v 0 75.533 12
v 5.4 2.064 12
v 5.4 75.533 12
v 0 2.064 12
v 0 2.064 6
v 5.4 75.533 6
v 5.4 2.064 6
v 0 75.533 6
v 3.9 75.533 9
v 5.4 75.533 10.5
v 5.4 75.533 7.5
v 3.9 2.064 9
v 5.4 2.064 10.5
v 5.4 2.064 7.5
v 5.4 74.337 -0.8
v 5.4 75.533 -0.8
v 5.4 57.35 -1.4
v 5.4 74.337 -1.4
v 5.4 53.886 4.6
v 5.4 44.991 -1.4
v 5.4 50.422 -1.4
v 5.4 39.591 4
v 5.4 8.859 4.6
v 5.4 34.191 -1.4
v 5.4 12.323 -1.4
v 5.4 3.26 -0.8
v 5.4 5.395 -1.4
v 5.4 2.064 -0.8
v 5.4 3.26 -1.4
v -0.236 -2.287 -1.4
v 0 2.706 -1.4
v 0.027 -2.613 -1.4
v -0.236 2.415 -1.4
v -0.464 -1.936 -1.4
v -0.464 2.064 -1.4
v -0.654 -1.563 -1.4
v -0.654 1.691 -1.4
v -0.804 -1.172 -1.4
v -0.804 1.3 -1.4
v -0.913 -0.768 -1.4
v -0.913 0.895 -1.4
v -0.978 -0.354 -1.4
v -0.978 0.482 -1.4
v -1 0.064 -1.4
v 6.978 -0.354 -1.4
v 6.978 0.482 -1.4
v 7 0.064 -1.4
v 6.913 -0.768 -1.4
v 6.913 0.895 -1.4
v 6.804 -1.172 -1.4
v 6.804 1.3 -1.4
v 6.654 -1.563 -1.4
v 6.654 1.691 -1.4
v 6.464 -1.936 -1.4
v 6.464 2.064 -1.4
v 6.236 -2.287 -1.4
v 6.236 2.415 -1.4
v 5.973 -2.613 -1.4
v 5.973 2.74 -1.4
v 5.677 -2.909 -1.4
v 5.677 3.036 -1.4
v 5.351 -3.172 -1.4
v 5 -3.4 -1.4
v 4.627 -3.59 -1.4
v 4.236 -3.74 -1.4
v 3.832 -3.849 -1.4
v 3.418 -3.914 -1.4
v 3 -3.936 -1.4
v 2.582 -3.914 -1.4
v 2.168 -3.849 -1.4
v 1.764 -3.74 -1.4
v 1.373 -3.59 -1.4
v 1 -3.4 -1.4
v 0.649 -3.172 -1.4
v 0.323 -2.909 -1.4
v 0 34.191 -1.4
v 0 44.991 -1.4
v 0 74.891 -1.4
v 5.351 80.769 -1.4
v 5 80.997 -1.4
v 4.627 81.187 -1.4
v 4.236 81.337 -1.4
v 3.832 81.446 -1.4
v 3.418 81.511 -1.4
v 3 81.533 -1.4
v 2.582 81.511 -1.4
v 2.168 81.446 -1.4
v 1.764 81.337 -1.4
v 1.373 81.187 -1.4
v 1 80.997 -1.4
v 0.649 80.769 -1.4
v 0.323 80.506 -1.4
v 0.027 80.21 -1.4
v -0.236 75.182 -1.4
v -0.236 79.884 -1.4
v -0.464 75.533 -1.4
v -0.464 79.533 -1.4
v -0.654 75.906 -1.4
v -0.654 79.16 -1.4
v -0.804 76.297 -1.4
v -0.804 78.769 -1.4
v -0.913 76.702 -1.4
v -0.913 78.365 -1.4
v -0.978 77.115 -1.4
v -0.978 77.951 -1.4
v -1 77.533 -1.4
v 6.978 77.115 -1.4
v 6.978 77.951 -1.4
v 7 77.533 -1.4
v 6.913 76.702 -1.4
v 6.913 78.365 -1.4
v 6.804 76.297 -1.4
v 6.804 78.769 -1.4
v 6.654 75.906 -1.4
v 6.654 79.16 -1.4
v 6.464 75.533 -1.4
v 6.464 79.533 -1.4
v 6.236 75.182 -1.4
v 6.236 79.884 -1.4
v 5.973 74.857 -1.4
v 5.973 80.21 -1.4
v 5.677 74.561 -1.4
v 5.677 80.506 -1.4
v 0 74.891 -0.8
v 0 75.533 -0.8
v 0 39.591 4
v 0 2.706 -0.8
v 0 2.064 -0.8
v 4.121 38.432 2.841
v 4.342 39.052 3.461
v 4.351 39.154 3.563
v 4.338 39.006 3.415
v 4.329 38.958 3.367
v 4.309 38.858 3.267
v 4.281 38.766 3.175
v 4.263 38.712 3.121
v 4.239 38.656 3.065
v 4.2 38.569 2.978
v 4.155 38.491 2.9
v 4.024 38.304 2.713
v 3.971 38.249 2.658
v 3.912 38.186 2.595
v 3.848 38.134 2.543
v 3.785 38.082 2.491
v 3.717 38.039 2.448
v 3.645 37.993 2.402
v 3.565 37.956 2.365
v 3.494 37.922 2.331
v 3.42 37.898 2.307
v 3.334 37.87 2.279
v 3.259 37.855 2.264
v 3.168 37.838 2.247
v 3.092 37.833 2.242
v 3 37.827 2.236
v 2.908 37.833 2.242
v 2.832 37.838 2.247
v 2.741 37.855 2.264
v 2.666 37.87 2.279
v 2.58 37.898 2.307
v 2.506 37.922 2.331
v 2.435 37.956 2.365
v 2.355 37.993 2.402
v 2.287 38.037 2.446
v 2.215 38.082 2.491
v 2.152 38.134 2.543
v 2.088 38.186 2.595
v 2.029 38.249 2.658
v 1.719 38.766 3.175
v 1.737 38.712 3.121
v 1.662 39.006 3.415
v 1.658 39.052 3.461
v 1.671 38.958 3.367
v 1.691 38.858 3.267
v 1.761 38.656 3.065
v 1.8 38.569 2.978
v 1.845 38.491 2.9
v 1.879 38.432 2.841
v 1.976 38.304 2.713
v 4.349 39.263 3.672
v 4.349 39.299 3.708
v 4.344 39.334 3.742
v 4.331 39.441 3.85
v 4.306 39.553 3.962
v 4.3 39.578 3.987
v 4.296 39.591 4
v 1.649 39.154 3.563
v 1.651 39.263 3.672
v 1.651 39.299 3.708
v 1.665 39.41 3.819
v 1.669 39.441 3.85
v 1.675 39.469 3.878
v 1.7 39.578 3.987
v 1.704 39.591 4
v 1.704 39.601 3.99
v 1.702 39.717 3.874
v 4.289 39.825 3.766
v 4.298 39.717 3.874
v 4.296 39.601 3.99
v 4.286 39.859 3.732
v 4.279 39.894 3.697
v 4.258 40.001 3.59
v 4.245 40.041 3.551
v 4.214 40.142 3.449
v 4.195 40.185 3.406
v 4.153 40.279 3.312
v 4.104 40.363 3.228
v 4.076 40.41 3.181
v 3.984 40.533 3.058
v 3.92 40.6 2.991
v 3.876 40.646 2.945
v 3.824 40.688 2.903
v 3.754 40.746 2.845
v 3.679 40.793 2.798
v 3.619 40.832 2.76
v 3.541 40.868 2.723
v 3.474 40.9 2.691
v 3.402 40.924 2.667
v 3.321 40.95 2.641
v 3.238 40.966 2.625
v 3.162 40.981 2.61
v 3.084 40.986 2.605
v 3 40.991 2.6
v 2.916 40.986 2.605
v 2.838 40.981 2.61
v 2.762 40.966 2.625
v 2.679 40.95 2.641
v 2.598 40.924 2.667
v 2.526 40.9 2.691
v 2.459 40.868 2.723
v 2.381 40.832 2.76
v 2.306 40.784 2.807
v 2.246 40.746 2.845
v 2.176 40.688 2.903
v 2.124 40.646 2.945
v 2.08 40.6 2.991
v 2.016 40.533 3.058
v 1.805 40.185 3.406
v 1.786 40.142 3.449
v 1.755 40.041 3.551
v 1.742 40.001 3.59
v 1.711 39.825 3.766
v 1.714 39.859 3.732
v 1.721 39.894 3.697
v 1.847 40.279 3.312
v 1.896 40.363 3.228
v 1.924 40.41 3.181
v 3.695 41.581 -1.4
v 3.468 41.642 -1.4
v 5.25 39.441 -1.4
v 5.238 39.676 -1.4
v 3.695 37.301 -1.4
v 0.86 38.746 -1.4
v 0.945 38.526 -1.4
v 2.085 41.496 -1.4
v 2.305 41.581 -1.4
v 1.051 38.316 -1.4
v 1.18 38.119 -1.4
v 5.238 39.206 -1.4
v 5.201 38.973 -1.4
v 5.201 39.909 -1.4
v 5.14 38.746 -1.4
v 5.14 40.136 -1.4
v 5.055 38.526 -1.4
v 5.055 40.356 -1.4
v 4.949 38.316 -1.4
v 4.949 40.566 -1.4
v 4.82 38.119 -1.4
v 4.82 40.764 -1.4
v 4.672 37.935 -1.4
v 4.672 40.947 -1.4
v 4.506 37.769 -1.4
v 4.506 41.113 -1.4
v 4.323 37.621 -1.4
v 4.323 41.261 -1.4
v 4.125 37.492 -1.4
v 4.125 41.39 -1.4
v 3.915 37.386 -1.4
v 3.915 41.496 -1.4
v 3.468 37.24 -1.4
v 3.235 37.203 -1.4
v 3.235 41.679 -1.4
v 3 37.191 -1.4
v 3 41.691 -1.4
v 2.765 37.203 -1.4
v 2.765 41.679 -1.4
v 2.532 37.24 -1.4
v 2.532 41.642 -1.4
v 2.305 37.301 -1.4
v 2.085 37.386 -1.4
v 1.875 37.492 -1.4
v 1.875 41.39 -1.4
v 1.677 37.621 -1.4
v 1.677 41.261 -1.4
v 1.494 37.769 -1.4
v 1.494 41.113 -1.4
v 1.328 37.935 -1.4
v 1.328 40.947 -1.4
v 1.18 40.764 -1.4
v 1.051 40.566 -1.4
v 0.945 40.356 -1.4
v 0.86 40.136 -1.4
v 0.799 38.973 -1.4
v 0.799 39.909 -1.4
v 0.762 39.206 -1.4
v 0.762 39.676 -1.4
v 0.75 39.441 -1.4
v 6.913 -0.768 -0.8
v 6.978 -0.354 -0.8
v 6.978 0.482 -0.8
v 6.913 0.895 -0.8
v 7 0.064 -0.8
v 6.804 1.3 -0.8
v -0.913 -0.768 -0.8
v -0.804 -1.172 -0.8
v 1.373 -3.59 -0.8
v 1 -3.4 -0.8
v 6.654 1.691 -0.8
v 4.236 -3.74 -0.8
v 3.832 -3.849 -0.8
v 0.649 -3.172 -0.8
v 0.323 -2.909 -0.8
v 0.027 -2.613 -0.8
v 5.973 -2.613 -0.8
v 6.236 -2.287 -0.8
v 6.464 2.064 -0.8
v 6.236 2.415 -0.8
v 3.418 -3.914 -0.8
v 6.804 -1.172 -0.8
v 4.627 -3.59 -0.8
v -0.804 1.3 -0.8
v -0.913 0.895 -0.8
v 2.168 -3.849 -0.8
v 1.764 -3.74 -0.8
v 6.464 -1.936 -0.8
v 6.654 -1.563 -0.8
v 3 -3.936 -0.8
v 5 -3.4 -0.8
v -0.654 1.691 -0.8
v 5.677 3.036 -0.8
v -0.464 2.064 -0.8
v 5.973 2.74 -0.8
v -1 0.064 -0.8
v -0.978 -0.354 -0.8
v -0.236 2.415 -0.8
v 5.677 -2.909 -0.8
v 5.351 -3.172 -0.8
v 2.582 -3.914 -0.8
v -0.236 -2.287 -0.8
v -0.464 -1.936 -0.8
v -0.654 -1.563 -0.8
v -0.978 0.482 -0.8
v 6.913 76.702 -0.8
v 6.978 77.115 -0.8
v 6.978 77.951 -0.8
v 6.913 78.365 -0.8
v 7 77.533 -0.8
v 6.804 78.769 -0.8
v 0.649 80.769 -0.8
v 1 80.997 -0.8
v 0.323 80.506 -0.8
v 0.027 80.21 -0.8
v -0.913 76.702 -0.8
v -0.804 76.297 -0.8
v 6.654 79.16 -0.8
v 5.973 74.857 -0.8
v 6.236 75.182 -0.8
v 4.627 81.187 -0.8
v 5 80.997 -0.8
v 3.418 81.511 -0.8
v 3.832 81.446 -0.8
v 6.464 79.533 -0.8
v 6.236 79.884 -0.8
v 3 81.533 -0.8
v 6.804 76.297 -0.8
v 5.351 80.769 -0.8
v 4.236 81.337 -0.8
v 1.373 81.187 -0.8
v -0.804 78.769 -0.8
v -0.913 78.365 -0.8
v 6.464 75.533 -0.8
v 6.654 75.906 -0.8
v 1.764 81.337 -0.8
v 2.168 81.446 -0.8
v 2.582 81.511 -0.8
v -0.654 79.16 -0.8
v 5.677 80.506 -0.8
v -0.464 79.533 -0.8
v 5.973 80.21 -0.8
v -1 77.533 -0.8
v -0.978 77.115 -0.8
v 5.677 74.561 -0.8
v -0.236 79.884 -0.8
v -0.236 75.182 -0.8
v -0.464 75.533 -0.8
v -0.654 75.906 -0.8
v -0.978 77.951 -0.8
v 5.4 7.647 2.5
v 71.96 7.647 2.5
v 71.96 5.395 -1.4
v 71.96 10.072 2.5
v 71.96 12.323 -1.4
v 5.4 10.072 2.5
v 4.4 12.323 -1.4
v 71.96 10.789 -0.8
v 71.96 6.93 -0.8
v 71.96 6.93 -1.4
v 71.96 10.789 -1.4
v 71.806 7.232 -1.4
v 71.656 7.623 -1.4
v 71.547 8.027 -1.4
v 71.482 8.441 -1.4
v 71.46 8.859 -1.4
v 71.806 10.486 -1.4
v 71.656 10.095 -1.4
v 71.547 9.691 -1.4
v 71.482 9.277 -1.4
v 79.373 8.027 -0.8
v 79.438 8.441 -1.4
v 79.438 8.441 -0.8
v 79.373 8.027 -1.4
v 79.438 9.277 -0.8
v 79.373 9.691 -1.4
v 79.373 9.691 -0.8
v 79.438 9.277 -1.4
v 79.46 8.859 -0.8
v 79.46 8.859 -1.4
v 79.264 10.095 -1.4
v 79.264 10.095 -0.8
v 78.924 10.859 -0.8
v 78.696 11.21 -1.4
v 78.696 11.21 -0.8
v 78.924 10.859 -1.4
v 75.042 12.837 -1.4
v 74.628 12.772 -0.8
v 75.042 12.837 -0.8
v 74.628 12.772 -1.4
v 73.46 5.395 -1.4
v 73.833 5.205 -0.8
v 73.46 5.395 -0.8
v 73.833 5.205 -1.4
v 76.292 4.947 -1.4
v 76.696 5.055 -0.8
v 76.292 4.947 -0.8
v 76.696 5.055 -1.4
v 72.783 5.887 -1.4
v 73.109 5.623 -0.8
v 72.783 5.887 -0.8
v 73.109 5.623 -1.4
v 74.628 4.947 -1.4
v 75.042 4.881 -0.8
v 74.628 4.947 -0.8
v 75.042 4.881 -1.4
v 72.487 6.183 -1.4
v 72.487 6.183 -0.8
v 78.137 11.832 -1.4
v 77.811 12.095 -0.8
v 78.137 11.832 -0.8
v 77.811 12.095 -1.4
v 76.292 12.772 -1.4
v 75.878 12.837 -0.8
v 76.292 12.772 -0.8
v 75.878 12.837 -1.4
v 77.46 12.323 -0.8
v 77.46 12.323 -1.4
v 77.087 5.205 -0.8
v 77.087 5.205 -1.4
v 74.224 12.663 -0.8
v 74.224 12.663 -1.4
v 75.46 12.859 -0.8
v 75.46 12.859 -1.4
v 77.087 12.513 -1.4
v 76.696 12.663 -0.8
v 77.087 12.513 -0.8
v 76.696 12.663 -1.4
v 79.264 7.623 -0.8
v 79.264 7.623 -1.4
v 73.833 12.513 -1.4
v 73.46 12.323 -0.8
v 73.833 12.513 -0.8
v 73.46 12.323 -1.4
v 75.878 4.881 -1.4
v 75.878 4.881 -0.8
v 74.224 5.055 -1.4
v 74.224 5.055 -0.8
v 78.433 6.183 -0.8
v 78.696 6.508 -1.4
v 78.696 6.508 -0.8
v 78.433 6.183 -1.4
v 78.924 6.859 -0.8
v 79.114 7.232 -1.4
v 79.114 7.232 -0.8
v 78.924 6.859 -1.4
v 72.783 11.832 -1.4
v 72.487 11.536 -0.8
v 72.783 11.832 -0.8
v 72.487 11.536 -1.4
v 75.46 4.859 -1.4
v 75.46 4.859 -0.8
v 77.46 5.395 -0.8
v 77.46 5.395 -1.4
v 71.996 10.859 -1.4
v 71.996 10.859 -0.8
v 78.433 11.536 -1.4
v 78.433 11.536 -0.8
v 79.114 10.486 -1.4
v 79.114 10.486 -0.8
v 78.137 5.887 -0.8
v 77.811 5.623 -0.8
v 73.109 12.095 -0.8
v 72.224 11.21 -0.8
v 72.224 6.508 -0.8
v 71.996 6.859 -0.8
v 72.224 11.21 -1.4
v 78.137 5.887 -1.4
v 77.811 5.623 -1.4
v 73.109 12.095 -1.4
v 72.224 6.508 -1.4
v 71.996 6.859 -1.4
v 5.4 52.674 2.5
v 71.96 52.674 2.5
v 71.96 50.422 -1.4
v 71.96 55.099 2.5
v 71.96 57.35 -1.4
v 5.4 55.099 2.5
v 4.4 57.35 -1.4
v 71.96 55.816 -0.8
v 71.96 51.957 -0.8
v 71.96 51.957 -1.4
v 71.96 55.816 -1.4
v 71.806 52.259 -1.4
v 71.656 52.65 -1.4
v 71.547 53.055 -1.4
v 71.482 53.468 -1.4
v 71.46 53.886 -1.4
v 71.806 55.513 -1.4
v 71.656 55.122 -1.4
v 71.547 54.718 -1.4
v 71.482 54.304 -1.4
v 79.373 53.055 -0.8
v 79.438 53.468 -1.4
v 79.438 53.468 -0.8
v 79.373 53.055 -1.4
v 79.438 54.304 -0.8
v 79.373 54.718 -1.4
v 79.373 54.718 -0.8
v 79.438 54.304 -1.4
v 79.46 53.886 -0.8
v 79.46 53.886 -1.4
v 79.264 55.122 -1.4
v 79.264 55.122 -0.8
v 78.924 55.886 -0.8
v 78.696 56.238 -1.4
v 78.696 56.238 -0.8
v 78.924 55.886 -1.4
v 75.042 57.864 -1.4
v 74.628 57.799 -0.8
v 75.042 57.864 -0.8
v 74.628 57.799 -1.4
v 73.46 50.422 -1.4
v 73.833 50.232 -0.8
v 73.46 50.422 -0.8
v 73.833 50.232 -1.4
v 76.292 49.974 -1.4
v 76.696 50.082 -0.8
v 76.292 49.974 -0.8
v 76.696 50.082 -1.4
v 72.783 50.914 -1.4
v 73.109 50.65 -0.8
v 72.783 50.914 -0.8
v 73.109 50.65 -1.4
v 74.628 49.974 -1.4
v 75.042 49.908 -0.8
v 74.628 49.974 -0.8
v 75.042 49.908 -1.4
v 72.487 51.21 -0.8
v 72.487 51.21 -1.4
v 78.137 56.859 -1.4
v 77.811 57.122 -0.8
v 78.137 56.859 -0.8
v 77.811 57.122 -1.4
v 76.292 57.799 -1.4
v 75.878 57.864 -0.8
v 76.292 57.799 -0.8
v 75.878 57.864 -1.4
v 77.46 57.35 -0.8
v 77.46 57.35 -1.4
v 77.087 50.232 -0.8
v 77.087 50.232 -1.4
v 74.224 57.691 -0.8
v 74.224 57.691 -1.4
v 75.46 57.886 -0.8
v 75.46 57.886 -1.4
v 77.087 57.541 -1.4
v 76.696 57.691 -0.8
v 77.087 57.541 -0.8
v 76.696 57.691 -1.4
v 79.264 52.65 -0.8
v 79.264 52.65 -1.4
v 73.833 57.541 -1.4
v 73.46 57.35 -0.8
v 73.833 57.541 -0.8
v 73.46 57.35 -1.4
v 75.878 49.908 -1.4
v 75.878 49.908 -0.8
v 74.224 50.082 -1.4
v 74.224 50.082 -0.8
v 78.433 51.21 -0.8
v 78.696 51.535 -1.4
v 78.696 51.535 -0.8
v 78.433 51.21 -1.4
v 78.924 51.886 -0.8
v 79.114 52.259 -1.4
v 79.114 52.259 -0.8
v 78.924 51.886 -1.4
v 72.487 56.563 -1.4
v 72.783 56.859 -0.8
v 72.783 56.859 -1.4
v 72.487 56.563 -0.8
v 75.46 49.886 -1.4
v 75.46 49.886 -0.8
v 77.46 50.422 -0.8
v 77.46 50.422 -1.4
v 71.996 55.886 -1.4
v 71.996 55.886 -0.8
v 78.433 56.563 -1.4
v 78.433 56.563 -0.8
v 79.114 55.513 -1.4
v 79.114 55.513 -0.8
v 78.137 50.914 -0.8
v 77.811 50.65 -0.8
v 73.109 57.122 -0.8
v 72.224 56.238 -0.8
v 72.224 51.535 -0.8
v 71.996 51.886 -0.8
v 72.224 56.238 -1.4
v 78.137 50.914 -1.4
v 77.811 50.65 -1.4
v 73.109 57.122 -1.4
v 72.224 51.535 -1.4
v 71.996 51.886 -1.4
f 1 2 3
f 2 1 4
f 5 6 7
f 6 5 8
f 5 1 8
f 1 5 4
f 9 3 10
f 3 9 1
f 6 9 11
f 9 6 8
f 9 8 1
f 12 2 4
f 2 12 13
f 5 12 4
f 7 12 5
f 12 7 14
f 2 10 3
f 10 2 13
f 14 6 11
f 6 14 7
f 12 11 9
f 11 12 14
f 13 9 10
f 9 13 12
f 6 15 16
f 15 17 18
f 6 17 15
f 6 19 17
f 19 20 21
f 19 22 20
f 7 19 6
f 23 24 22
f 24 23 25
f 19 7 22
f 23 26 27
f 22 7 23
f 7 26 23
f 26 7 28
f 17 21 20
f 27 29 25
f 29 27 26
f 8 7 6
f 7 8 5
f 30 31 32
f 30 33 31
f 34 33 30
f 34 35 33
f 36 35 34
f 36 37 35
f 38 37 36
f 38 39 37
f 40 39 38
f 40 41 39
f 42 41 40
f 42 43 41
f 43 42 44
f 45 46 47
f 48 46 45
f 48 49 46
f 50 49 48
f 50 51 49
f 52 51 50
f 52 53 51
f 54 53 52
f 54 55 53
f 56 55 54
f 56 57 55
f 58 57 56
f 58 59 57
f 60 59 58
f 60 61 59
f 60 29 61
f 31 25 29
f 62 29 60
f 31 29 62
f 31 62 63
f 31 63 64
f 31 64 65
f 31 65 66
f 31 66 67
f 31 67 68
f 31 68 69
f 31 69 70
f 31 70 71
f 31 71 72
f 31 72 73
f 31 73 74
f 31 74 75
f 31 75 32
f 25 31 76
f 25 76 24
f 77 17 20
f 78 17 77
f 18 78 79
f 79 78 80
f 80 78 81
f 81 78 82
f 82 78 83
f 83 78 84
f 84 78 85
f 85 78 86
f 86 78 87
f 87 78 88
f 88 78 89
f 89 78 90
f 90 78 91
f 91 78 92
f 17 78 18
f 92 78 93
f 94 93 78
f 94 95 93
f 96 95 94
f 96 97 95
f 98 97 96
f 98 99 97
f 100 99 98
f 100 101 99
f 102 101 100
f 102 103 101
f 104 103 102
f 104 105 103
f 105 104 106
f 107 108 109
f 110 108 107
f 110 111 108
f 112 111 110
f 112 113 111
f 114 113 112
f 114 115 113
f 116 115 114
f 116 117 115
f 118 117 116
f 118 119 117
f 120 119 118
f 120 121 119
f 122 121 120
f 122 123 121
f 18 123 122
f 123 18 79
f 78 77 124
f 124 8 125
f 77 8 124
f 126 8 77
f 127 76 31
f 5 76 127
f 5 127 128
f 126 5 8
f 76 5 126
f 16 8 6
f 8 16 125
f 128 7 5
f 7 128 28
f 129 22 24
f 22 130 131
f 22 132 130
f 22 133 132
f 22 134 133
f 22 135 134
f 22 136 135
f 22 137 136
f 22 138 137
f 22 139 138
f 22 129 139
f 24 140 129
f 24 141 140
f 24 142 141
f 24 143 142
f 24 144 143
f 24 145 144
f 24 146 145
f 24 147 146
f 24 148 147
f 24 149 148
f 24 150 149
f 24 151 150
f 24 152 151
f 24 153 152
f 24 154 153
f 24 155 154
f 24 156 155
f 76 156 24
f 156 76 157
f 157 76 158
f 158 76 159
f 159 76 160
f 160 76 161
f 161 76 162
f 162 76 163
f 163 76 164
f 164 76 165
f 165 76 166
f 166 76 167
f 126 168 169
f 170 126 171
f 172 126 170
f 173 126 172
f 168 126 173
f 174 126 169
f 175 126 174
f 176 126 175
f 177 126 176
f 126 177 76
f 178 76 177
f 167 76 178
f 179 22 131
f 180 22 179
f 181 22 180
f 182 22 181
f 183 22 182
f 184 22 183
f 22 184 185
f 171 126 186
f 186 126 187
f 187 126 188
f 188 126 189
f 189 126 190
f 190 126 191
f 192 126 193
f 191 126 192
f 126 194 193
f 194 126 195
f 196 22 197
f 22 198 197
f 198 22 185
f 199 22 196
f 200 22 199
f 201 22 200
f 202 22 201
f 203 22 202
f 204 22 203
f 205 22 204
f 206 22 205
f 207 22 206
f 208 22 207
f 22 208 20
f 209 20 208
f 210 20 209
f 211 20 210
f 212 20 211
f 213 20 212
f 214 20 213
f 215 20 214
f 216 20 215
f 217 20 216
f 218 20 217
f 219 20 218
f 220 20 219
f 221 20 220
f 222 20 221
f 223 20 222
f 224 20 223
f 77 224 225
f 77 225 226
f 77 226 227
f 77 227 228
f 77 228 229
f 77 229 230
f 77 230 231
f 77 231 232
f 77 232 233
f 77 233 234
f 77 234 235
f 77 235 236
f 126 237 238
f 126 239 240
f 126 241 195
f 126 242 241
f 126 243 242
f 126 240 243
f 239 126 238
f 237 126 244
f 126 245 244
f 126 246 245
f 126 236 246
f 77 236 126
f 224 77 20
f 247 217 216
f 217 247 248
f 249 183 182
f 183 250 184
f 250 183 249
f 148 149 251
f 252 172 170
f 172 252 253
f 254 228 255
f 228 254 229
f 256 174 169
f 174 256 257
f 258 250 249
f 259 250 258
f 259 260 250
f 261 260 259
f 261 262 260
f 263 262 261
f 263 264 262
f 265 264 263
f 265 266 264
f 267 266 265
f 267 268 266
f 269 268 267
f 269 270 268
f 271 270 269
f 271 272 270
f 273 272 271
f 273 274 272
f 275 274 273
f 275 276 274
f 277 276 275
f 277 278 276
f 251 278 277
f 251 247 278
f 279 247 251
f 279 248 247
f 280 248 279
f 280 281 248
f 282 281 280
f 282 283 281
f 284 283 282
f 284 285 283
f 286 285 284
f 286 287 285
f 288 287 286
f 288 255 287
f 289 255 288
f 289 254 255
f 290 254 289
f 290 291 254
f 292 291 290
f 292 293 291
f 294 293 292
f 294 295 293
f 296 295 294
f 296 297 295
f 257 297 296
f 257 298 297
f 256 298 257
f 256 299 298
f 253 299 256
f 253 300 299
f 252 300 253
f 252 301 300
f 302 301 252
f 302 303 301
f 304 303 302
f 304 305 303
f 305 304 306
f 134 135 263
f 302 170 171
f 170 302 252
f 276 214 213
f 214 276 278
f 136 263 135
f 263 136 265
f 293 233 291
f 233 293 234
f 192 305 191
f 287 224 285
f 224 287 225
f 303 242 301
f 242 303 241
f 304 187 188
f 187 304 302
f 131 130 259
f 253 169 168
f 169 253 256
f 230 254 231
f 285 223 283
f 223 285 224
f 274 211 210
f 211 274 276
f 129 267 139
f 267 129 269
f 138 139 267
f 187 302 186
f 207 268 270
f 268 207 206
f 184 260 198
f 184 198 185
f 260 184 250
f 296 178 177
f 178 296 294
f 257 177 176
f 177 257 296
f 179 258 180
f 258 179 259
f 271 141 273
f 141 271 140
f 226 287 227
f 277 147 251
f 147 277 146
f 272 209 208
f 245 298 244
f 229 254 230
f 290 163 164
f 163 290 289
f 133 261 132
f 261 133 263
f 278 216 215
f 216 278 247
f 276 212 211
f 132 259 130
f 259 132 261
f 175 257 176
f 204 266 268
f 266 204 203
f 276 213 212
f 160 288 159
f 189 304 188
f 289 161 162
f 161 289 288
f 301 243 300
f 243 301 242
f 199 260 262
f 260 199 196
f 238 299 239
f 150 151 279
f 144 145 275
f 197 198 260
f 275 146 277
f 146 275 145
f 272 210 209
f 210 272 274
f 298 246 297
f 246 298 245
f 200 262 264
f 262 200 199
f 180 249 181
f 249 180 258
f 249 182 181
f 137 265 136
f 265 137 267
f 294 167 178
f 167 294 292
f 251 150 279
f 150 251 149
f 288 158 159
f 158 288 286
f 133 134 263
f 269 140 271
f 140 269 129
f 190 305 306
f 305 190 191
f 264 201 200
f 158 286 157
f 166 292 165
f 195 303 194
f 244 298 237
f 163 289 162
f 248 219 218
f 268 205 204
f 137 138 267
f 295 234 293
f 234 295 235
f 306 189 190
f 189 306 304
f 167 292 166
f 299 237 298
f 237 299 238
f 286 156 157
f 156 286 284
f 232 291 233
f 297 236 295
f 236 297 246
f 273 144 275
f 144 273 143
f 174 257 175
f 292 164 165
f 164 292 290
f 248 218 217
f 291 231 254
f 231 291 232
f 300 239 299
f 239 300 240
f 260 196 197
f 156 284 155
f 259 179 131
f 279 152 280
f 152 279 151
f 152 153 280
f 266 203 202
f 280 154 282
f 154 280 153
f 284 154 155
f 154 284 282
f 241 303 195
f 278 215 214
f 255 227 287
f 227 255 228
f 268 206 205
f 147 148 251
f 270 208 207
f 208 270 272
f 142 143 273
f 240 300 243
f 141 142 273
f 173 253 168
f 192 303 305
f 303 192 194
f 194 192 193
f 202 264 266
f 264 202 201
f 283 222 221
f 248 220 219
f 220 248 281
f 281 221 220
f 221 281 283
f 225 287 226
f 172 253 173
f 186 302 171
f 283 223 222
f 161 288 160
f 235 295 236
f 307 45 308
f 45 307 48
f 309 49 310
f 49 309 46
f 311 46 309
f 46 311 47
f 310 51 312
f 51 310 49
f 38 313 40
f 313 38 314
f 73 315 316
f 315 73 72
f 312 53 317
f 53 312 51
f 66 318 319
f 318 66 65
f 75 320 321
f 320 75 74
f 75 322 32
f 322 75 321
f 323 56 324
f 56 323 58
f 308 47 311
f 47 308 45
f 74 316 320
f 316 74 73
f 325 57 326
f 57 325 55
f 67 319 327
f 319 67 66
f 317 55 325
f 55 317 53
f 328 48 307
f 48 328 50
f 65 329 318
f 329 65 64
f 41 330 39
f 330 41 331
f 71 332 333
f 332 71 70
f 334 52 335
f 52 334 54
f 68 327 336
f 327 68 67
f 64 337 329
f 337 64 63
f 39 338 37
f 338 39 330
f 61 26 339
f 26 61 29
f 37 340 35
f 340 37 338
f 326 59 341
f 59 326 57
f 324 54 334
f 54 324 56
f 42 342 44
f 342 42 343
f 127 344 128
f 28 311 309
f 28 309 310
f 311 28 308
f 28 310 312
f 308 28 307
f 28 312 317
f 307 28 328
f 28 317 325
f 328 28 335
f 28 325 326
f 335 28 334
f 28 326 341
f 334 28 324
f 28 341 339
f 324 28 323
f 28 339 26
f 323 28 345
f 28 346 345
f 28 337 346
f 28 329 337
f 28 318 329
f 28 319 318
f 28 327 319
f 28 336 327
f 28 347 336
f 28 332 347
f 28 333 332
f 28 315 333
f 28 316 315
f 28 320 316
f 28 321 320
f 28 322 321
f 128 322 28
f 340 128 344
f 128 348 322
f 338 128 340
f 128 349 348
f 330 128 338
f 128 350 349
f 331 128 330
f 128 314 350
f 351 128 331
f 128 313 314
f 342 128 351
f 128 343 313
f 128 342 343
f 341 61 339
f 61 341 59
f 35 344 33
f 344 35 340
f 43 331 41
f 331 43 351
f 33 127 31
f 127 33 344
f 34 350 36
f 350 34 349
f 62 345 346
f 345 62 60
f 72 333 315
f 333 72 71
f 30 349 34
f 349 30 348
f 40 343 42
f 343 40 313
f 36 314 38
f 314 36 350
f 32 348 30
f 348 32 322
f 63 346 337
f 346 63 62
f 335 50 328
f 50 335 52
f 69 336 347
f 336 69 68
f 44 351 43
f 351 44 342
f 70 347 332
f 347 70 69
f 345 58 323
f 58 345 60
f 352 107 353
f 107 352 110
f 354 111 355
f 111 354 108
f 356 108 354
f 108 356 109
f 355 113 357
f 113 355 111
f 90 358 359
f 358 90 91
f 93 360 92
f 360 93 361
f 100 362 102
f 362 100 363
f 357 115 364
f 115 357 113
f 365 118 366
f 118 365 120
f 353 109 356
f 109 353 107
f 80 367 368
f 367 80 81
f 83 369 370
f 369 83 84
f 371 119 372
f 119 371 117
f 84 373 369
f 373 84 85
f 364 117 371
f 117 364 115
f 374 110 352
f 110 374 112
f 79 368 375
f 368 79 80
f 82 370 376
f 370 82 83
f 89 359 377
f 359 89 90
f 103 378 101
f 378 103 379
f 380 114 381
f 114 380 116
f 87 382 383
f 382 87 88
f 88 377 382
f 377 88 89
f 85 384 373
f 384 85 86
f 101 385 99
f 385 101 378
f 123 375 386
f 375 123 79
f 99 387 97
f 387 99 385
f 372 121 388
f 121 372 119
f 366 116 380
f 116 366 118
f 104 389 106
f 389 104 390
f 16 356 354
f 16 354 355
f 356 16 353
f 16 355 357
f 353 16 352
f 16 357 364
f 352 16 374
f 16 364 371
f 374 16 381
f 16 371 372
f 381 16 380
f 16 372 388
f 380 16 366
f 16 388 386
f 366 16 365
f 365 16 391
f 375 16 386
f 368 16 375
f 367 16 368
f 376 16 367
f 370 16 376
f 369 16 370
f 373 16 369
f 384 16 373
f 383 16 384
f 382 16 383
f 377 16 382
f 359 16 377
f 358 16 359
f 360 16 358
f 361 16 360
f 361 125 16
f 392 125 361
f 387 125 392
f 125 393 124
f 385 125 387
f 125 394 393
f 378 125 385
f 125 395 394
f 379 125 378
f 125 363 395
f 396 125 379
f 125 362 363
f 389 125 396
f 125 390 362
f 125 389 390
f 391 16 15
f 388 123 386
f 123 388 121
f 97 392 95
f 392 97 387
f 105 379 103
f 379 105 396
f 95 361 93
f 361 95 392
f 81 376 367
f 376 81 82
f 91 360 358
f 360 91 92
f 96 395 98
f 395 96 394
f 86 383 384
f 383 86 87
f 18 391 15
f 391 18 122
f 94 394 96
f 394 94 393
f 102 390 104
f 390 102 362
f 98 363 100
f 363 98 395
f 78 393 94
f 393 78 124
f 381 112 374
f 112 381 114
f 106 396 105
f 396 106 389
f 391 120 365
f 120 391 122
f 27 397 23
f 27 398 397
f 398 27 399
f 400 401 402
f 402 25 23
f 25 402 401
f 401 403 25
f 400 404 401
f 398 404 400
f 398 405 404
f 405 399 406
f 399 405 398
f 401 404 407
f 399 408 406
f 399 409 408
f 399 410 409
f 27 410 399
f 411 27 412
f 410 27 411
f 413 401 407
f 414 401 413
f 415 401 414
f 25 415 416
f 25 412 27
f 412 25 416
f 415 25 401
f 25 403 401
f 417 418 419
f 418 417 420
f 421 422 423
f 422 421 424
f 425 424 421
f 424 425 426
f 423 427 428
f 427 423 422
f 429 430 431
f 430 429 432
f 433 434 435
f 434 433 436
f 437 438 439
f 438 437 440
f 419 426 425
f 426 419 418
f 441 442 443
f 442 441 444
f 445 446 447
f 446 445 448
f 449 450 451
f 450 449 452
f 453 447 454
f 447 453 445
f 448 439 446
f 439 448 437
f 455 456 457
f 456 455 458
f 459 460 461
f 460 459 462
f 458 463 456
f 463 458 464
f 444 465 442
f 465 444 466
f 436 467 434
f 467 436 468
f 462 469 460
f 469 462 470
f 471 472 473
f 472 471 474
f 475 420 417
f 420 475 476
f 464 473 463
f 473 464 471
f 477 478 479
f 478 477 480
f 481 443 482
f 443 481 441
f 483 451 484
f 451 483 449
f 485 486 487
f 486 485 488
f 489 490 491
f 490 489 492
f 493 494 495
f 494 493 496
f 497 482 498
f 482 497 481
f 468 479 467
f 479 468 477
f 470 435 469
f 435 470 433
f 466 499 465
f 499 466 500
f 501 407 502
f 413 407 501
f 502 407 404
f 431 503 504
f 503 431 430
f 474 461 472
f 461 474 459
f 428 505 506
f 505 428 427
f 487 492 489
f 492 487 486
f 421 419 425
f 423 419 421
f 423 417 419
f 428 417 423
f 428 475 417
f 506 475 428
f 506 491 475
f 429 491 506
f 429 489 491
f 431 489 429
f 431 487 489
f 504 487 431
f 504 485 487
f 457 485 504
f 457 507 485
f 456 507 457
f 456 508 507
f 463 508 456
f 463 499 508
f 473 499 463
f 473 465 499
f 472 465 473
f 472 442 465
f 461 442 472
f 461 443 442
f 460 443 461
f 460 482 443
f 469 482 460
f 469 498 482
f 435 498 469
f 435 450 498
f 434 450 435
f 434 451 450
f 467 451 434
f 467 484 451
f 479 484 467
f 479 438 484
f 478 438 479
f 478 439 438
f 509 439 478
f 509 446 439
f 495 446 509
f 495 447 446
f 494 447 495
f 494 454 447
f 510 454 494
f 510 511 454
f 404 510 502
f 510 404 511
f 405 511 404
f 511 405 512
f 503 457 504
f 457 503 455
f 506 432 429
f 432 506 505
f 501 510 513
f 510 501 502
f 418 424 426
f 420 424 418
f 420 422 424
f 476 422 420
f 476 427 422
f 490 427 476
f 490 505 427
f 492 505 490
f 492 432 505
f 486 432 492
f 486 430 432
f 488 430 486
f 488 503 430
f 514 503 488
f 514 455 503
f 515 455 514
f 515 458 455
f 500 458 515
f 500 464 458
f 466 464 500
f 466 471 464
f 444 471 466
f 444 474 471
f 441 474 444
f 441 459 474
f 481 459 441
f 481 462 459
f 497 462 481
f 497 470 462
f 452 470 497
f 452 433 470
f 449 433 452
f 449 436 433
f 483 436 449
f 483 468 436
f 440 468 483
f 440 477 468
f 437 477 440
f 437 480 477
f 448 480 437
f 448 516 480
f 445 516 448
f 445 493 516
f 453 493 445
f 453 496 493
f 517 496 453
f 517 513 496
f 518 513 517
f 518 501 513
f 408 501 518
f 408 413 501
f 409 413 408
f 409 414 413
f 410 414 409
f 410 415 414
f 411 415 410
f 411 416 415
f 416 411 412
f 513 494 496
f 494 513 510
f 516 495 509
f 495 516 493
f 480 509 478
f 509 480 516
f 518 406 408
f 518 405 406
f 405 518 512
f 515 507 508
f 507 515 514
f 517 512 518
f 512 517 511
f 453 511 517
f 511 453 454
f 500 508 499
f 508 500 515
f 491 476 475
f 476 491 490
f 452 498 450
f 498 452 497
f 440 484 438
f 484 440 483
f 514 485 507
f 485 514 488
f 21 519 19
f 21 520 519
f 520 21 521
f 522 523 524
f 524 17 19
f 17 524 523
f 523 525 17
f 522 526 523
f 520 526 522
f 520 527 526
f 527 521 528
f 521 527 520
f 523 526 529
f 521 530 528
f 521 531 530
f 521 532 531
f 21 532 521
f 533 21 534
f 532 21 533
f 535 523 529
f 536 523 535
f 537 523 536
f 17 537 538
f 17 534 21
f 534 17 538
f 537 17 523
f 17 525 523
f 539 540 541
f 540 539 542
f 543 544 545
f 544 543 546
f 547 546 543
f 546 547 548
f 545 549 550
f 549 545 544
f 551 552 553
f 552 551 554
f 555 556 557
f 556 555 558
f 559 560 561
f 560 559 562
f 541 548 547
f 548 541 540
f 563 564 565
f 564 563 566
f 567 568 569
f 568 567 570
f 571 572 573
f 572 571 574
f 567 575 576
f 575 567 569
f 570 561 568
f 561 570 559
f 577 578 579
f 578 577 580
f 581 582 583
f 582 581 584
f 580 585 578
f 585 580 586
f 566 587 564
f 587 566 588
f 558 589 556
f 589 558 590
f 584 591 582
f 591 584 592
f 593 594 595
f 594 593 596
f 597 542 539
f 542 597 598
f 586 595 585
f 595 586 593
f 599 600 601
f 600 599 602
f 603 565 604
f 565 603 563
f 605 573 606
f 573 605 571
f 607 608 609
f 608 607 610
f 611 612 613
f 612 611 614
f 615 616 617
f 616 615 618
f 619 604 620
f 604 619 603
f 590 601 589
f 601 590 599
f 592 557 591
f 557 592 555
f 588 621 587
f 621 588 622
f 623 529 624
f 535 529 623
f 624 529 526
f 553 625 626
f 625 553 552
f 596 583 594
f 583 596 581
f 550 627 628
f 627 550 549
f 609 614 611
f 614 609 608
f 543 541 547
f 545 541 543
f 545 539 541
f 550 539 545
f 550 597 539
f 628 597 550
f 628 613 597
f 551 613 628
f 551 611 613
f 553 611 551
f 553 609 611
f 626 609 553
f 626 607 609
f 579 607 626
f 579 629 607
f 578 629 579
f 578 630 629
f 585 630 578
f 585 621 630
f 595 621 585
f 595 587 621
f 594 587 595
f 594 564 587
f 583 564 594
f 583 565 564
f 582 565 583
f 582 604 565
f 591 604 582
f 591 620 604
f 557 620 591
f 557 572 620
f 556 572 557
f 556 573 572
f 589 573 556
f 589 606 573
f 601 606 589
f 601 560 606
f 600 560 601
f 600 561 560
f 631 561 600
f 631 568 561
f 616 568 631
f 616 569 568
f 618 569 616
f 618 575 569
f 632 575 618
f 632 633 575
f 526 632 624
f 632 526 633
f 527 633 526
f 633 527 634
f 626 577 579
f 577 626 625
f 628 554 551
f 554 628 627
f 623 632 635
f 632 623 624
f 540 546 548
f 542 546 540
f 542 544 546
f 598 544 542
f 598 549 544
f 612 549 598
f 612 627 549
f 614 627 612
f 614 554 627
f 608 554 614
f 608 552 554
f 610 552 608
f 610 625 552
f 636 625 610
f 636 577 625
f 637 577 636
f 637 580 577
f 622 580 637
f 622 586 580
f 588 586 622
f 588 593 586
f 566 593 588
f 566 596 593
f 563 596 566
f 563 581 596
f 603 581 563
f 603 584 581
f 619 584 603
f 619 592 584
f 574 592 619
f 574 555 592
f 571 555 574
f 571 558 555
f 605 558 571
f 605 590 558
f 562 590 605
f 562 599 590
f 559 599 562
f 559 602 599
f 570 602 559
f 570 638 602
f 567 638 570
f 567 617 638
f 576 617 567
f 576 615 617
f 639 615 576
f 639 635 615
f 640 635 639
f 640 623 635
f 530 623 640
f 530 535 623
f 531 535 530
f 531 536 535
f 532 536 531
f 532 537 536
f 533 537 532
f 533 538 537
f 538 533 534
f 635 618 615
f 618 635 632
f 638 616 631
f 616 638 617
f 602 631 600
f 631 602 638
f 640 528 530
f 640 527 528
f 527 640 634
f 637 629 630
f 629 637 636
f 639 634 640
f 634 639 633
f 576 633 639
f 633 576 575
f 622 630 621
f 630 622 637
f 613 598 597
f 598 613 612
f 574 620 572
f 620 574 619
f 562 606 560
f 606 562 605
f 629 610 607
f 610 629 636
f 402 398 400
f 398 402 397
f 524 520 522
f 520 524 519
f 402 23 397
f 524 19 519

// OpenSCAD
$fn=60;

t=3;    // Thickness
tt=t+t; // Thickness * 2

breadboardWidth=56.3;
breadboardLength=165.1;
breadboardHeight=9.6;

rodWidth=8;
rodLength=breadboardWidth*1.2;

baseHeight=8;


module rod (rodWidth, rodLength) {
  rotate([60,0,0]) rotate([0, 90, 0])
    cylinder(h=rodLength, r=rodWidth/2, $fn=3);
}


module outerJaw (length) {
  difference () {
    cube([tt, length, tt]);
    translate([tt*0.9,0,0])
      cube([tt, length, tt]);
    translate([t*1.3, 0, t])
      rotate([0,45,0])
      cube([tt, length, tt]);
  }
}

module jawAssembly () {
  union() {
    translate([0, breadboardLength*0.025/2, tt])
      outerJaw(breadboardLength*0.89/2);
    
    translate([0, breadboardLength*0.025/2, -1.4])
      union() {
      difference() {
        cube([tt*0.9, breadboardLength*0.89/2, tt+1.4]);
        translate([0, 0.5, 0])
          translate([-2, breadboardLength/11*3 - t*3 +1, tt*0.9]) // -3 for lazy
          rotate([45,0,0])
          rotate([180,0,0])
          cube([tt+4, tt+2, tt+2]);
      }
      
      translate([0, -3.15, 0])
        translate([t, breadboardLength/11*3 -tt*0.75, 0]) // -3 for lazy
        cylinder(r1=t*1.5/2, r2=t*0.4, h=tt);
      
      translate([t,-2,0])
        cylinder(r=4, h=0.6);
      translate([t, breadboardLength*0.89/2+2,0])
        cylinder(r=4, h=0.6);
    }
    
    translate([tt*0.9, -3, 1])  // Why is this 1mm?
      difference() {
      union() {
        translate([0, -3.15, 0])
          translate([-1, breadboardLength/11*1, -0.4]) // 0.24 is too magic
          union() {
          rod(rodWidth, rodLength);
          translate([rodLength+3.5, 0, -2]) // 0.24 is too magic
            cylinder(r=4, h=0.6);
        }

        translate([0, -3.15, 0])
          translate([-1, breadboardLength/11*4, -0.4])      
          union() {
          rod(rodWidth, rodLength);
          translate([rodLength+3.5, 0, -2]) // 0.24 is too magic
            cylinder(r=4, h=0.6);
        }
      }
      translate([0, 0, 1.5])
        cube([breadboardLength, rodLength, 4]);
    }
  }

}

module base () {
  union() {
    difference() {

      union() {
        cube([breadboardWidth, breadboardLength, baseHeight]);
      
        translate([breadboardWidth, 0, tt+3.5])
          outerJaw(breadboardLength);
        translate([breadboardWidth, 0, 0])
          cube([tt, breadboardLength, tt+3.5]);

        translate([0, 0, tt*2+3.5])  //  Too much magic because of the 3 sided cylinders
          rotate([0, 180,0])
          outerJaw(breadboardLength);
        translate([-tt, 0, 0])
          cube([tt, breadboardLength, tt+3.5]);
      }

      translate([(breadboardWidth-t)/2, 0, 0])
        cube([t, breadboardLength, t/2]);
        
      translate([t, t, tt])
        cube([breadboardWidth-tt, breadboardLength-tt, breadboardHeight]);

      translate([0, 0, tt])
        cube([breadboardWidth, breadboardLength, breadboardHeight]);

    
      for (i= [1:10]) {
        translate([-tt-1, breadboardLength/11*i, t*1.5])
          rod(rodWidth*1.18, 2+rodLength+tt*2);
      }
    }
  }
}


//base();

jawAssembly();
